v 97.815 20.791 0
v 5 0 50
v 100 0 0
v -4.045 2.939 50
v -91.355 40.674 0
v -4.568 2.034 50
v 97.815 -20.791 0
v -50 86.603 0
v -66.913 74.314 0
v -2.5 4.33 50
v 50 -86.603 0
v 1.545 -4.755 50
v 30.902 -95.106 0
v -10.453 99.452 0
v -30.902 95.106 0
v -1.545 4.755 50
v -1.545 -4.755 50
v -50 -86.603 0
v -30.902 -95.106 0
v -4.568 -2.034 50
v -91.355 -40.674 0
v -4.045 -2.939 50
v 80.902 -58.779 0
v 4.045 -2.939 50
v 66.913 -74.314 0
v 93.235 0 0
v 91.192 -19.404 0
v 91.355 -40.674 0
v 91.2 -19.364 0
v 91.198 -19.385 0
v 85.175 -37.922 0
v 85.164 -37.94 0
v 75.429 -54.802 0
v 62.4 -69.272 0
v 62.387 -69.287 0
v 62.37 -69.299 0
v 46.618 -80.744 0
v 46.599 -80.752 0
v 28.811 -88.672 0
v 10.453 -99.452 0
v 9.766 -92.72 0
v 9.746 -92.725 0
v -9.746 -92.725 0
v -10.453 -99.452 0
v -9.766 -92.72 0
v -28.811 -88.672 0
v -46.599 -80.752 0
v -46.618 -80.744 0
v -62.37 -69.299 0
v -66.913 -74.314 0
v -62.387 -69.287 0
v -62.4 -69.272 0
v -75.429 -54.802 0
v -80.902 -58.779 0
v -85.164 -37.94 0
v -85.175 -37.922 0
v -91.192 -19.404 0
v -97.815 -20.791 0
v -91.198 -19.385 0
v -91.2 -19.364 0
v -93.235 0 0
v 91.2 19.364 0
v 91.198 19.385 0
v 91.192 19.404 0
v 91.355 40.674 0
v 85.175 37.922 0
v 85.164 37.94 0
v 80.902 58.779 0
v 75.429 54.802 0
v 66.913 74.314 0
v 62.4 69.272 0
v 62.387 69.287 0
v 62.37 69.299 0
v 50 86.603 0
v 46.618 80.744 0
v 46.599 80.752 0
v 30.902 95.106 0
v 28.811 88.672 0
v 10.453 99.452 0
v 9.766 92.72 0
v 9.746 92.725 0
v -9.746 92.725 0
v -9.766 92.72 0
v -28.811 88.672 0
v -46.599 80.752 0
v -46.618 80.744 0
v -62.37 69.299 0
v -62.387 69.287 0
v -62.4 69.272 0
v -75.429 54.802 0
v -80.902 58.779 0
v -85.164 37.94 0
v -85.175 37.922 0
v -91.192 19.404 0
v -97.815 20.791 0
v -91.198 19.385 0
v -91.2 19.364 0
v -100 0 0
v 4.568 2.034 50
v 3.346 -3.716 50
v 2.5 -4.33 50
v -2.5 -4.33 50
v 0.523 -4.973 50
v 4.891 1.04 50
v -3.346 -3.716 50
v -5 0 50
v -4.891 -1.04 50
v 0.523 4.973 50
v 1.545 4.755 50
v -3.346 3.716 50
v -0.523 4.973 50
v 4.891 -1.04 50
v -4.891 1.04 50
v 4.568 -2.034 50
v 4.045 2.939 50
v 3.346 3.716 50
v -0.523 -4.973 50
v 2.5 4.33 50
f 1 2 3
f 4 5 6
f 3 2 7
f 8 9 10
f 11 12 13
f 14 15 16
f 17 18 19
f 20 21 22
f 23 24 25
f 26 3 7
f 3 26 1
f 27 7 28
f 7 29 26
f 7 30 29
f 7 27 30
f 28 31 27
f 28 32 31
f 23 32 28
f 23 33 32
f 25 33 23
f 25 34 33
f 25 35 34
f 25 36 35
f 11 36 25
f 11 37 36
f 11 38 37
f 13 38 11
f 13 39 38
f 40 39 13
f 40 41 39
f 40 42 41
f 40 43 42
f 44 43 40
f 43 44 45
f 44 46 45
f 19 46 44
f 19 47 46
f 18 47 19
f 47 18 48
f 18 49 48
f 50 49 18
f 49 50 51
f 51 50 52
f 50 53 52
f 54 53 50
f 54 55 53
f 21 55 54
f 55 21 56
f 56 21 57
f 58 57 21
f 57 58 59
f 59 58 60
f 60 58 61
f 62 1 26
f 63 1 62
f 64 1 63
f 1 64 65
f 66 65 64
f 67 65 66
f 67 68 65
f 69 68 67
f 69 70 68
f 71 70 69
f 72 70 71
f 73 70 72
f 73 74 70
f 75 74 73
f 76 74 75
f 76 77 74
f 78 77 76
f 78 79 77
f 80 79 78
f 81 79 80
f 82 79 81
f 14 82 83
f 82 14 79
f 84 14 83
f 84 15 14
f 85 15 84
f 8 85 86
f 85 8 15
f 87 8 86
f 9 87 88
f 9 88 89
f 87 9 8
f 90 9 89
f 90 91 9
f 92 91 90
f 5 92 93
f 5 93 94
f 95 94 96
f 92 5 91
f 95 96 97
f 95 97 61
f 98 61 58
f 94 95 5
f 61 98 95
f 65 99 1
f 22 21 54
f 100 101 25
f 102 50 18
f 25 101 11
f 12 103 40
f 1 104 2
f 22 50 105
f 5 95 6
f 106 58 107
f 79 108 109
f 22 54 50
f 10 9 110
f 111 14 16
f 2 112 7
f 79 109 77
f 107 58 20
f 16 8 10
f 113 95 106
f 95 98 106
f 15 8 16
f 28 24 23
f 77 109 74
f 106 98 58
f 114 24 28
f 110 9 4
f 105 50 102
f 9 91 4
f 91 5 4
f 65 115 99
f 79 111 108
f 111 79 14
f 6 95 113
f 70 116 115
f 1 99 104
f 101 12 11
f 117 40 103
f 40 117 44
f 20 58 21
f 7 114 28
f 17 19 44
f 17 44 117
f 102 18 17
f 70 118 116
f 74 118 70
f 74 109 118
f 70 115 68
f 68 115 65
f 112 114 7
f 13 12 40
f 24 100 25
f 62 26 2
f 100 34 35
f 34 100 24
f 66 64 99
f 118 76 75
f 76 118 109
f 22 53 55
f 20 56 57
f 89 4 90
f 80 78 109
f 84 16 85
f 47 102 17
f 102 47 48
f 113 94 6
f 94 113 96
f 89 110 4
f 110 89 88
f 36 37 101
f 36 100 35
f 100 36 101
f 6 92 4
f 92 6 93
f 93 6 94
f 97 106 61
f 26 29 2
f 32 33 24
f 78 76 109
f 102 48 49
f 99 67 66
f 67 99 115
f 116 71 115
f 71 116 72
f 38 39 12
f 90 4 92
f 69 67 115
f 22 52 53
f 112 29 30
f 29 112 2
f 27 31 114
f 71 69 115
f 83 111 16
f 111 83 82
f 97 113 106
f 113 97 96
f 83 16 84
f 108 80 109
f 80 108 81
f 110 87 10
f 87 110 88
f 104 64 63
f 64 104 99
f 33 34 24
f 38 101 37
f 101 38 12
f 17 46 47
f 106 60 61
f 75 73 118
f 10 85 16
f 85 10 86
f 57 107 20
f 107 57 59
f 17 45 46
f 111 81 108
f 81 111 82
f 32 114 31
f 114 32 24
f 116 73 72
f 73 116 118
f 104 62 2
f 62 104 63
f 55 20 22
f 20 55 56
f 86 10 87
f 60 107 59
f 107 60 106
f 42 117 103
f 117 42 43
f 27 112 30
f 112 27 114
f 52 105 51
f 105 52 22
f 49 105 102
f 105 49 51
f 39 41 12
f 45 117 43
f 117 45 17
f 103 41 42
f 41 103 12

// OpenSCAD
// Define parameters for the hat
hat_height = 50;            // Height of the conical hat part
hat_rad_top = 5;            // Top radius (small point of the cone)
hat_rad_bottom = 100;       // Bottom radius of the hat

// Create the conical part of the hat
module chinese_hat() {
    difference() {
        // Cone
        cylinder(h = hat_height, r1 = hat_rad_bottom, r2 = hat_rad_top);

        // Hollow inside
        translate([0, 0, -1])
        cylinder(h = hat_height + 1, r1 = hat_rad_bottom - 5, r2 = hat_rad_top);
    }
}

// Render the hat
chinese_hat();
